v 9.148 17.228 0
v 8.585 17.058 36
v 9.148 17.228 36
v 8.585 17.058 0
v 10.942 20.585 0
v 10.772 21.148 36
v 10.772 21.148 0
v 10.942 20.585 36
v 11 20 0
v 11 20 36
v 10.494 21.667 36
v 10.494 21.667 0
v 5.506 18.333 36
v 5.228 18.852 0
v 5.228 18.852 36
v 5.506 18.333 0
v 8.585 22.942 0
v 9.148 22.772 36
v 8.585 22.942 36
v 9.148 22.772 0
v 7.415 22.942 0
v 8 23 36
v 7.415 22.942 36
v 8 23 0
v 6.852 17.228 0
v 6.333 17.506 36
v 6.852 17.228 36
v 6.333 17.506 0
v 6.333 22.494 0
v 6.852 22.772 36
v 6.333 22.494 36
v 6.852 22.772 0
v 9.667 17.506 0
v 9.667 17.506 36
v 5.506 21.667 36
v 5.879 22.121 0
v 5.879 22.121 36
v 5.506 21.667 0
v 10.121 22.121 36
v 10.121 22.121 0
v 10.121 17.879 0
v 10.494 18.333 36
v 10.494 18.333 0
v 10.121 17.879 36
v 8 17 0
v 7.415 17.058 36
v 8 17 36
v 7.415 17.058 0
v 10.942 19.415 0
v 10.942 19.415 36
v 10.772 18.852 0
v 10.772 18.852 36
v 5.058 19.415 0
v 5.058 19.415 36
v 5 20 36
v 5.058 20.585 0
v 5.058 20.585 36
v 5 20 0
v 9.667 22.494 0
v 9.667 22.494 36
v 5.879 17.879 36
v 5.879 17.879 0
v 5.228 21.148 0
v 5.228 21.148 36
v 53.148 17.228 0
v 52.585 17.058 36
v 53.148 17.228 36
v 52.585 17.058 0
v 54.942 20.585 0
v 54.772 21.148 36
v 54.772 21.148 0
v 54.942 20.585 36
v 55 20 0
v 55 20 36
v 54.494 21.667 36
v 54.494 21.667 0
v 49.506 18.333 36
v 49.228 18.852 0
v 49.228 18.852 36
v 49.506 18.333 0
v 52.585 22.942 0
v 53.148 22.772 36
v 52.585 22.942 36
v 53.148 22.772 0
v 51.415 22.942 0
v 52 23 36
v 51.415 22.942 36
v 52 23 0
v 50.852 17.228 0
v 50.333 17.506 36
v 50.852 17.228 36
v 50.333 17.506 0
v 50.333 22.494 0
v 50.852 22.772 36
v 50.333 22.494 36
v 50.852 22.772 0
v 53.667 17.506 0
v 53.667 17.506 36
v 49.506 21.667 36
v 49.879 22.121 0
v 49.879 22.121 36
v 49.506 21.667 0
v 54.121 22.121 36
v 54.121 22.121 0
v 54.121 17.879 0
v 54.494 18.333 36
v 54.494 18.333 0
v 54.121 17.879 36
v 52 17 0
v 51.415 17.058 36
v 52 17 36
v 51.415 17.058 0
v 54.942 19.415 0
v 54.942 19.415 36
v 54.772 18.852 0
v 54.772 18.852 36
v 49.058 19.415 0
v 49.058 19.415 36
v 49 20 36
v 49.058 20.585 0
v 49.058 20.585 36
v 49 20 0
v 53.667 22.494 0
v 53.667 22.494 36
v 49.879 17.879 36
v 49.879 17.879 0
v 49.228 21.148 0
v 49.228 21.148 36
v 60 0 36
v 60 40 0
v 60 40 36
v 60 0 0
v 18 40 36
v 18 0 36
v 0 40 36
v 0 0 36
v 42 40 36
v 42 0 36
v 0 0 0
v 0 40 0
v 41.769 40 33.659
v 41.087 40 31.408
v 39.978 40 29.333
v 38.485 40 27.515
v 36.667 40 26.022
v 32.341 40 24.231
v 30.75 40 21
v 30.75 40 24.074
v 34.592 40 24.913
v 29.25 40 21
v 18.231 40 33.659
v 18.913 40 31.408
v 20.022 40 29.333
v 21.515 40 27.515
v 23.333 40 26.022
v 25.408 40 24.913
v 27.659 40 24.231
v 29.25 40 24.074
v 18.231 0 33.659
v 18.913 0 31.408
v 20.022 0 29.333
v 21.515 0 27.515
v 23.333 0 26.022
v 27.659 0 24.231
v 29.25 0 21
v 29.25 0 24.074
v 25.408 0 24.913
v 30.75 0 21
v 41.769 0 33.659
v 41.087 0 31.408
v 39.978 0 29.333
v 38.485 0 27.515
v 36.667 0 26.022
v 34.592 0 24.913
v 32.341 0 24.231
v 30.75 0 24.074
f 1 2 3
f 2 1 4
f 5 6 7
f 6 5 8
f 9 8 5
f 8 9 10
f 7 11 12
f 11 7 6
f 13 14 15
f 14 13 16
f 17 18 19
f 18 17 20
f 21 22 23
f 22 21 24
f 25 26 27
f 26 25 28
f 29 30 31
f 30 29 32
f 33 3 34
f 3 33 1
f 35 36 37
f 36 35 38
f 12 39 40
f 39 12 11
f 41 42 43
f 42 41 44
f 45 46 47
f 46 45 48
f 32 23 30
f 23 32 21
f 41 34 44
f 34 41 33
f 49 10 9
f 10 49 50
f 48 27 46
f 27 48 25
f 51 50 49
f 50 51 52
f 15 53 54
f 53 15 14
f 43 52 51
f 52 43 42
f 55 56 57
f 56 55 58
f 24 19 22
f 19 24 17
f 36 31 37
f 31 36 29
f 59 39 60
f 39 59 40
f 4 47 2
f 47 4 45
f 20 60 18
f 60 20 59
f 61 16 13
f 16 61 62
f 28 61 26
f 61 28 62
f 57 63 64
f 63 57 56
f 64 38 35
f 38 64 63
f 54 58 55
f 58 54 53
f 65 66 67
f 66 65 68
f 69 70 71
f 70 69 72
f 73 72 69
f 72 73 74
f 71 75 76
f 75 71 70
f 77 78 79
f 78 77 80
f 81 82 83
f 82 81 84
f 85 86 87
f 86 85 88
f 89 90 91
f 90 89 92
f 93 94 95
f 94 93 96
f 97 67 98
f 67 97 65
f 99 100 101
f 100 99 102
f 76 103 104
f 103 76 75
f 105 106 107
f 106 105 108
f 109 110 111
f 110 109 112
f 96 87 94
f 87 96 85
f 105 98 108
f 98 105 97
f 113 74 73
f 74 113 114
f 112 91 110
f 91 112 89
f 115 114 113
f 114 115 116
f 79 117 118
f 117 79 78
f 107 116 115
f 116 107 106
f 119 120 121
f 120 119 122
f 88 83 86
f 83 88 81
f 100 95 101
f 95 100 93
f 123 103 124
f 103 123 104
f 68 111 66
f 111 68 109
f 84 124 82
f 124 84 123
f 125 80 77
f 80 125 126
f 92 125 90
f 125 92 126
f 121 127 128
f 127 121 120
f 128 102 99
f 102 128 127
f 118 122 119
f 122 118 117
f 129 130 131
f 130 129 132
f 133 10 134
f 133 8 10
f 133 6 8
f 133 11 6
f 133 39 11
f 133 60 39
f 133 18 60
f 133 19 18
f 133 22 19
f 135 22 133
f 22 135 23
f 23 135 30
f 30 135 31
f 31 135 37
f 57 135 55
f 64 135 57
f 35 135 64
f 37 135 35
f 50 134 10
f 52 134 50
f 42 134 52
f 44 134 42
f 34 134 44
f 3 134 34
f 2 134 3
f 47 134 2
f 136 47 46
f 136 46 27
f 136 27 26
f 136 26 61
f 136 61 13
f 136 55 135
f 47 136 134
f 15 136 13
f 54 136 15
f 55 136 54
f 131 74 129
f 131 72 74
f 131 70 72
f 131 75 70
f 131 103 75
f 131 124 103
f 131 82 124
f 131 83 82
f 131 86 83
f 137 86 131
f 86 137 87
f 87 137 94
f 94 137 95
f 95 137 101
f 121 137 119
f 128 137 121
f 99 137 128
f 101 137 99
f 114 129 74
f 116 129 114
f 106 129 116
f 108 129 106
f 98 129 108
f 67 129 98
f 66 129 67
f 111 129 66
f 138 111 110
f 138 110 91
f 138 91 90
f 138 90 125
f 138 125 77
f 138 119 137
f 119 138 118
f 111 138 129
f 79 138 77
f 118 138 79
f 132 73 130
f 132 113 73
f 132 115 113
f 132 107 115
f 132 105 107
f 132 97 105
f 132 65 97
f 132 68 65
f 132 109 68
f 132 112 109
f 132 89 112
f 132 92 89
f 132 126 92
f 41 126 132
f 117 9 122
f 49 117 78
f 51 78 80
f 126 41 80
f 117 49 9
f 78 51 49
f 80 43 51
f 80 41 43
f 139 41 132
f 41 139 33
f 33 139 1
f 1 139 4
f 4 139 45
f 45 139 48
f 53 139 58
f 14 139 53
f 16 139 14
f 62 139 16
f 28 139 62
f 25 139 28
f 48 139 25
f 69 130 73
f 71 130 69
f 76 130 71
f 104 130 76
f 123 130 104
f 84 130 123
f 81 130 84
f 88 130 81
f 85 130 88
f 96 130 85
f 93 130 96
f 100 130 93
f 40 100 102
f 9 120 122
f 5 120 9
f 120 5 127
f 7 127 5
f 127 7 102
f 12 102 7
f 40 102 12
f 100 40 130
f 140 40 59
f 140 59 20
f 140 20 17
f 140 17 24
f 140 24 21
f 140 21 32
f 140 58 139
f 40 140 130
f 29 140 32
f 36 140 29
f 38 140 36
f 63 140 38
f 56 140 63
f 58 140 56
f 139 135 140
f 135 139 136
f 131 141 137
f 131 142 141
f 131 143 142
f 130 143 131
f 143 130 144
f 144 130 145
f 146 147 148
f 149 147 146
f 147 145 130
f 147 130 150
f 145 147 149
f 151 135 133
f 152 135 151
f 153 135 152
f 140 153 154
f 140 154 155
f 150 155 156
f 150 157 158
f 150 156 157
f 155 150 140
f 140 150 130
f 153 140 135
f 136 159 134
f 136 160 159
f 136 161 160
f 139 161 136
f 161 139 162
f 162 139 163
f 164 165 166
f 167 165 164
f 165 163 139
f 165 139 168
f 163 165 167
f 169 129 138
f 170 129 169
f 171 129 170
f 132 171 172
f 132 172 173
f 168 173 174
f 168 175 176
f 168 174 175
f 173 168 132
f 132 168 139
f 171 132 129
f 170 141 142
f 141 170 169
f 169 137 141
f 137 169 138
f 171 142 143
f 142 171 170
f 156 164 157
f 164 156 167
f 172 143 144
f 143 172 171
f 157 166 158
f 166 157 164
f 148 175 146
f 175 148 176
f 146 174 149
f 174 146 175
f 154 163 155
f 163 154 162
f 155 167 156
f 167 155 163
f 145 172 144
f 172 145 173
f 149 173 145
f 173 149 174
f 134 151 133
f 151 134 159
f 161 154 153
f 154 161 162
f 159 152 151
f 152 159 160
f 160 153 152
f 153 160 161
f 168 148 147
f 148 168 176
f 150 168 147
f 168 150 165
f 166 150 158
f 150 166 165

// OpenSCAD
$fn = 32;

// ----------------------------------------------------------------------
// Saddle clamp: split shaft clamp
// ----------------------------------------------------------------------

// --- parameters (mm) ---
blk_l = 60;               // block length, X
blk_w = 40;               // block width, Y
blk_h = 36;               // block height
clamp_r = 12;             // shaft groove radius
hole_r = 3;               // bolt hole radius
hole_m = 8;               // bolt hole margin from the ends
saw_w = 1.5;              // saw kerf width

saw_depth = clamp_r + 3;  // saw kerf depth

difference() {
  cube([blk_l, blk_w, blk_h]);
  translate([blk_l / 2, -1, blk_h])
    rotate([-90, 0, 0])
      cylinder(h = blk_w + 2, r = clamp_r);
  for (sx = [0, 1])
    translate([sx ? blk_l - hole_m : hole_m, blk_w / 2, -1])
      cylinder(r = hole_r, h = blk_h + 2);
  translate([blk_l / 2 - saw_w / 2, -1, blk_h - saw_depth])
    cube([saw_w, blk_w + 2, saw_depth + 1]);
}
